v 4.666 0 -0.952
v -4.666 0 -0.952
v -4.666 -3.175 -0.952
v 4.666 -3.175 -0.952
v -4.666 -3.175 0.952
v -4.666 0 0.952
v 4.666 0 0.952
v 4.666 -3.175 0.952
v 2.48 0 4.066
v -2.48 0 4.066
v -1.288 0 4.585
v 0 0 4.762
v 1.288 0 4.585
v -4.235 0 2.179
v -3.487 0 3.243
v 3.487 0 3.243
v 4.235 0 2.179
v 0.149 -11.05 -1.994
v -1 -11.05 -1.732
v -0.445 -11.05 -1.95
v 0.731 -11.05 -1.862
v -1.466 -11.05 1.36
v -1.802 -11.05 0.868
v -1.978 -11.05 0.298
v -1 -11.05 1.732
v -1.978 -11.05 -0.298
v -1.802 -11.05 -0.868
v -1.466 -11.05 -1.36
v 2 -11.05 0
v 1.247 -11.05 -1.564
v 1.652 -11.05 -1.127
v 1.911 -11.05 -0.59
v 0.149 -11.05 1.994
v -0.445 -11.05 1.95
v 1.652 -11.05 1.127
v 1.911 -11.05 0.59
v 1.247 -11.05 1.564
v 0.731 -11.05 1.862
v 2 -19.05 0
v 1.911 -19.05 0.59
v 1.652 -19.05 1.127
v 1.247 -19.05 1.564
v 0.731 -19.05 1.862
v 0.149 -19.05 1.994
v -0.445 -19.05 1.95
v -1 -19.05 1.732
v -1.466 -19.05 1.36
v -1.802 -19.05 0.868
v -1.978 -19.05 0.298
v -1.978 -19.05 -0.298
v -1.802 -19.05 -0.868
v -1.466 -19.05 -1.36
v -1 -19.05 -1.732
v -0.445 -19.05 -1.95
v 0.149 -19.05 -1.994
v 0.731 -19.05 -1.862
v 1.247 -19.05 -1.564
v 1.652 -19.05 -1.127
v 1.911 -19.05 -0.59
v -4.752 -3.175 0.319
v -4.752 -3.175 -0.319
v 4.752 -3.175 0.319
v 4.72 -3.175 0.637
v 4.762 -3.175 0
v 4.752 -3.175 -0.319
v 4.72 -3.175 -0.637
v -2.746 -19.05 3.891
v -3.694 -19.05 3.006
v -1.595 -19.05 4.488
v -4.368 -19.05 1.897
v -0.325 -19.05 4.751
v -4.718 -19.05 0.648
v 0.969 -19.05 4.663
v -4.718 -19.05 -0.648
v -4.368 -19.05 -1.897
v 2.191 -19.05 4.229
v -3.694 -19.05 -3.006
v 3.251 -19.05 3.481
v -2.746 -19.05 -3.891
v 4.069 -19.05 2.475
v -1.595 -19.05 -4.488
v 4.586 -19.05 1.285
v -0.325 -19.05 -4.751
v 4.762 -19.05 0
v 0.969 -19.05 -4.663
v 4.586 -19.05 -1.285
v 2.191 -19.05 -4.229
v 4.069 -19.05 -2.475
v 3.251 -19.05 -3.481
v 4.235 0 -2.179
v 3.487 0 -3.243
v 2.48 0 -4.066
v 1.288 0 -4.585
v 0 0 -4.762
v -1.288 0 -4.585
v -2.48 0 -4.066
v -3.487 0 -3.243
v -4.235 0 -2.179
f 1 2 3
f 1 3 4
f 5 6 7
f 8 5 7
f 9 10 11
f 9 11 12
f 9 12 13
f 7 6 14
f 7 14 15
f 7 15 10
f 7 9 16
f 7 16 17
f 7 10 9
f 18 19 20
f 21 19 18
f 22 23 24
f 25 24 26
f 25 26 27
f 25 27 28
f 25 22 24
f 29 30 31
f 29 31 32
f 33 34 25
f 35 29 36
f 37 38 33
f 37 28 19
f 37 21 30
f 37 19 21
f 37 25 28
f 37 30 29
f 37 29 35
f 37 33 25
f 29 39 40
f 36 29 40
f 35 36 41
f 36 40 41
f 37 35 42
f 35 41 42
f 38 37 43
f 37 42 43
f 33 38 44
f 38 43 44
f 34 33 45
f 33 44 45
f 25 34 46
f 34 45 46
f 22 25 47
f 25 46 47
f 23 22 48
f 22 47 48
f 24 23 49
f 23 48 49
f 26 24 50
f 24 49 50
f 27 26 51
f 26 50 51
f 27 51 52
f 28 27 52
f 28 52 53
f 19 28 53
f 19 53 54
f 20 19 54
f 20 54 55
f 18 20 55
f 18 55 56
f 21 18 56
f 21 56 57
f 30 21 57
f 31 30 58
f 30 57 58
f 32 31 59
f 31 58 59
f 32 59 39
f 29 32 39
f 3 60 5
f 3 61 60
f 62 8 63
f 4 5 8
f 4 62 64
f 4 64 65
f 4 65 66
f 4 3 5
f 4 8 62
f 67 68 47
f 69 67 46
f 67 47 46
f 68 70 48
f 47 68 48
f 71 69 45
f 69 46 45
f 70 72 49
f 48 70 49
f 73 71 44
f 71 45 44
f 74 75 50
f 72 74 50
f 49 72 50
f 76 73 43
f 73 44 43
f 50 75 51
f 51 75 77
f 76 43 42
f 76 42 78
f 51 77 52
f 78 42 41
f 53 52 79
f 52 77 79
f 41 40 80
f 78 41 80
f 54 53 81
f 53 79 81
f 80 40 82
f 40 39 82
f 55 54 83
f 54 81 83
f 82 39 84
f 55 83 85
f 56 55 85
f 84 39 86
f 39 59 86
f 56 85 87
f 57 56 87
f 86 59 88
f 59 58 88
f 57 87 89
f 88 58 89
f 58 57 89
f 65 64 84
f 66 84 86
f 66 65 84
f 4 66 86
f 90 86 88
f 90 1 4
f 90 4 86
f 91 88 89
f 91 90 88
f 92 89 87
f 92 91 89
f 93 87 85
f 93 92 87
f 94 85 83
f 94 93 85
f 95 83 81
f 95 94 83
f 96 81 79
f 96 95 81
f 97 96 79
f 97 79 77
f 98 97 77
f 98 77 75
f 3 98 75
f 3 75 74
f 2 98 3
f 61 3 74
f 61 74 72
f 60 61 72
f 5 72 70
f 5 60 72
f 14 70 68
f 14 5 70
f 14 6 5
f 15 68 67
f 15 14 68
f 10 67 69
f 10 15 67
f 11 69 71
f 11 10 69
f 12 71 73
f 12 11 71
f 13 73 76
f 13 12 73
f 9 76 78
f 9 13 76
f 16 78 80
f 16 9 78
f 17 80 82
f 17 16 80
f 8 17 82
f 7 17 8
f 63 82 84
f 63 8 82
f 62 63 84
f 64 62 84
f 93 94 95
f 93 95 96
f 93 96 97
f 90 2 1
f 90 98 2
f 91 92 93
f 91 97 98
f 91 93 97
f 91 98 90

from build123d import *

# Parameters (mm, degrees)
SKETCH1_R           = 4.7625
BOSS_EXTRUDE1_DEPTH = 19.05
SKETCH2_W           = 9.525
SKETCH2_H           = 1.905
CUT_EXTRUDE1_DEPTH  = 3.175
SKETCH3_R           = 2
CUT_EXTRUDE2_DEPTH  = 8


with BuildPart() as part:
    # Sketch1 → Boss-Extrude1 (new body)
    with BuildSketch(Plane(origin=(0, 0, 0), x_dir=(1, 0, 0), z_dir=(0, 1, 0))):
        Circle(SKETCH1_R)
    extrude(amount=-BOSS_EXTRUDE1_DEPTH)

    # Sketch2 → Cut-Extrude1 (cut)
    with BuildSketch(Plane(origin=(0, 0, 0), x_dir=(1, 0, 0), z_dir=(0, 1, 0))):
        Rectangle(SKETCH2_W, SKETCH2_H)
    extrude(amount=-CUT_EXTRUDE1_DEPTH, mode=Mode.SUBTRACT)

    # Sketch3 → Cut-Extrude2 (cut)
    with BuildSketch(Plane.XZ.offset(19.05)):
        Circle(SKETCH3_R)
    extrude(amount=-CUT_EXTRUDE2_DEPTH, mode=Mode.SUBTRACT)


solid = part.part
